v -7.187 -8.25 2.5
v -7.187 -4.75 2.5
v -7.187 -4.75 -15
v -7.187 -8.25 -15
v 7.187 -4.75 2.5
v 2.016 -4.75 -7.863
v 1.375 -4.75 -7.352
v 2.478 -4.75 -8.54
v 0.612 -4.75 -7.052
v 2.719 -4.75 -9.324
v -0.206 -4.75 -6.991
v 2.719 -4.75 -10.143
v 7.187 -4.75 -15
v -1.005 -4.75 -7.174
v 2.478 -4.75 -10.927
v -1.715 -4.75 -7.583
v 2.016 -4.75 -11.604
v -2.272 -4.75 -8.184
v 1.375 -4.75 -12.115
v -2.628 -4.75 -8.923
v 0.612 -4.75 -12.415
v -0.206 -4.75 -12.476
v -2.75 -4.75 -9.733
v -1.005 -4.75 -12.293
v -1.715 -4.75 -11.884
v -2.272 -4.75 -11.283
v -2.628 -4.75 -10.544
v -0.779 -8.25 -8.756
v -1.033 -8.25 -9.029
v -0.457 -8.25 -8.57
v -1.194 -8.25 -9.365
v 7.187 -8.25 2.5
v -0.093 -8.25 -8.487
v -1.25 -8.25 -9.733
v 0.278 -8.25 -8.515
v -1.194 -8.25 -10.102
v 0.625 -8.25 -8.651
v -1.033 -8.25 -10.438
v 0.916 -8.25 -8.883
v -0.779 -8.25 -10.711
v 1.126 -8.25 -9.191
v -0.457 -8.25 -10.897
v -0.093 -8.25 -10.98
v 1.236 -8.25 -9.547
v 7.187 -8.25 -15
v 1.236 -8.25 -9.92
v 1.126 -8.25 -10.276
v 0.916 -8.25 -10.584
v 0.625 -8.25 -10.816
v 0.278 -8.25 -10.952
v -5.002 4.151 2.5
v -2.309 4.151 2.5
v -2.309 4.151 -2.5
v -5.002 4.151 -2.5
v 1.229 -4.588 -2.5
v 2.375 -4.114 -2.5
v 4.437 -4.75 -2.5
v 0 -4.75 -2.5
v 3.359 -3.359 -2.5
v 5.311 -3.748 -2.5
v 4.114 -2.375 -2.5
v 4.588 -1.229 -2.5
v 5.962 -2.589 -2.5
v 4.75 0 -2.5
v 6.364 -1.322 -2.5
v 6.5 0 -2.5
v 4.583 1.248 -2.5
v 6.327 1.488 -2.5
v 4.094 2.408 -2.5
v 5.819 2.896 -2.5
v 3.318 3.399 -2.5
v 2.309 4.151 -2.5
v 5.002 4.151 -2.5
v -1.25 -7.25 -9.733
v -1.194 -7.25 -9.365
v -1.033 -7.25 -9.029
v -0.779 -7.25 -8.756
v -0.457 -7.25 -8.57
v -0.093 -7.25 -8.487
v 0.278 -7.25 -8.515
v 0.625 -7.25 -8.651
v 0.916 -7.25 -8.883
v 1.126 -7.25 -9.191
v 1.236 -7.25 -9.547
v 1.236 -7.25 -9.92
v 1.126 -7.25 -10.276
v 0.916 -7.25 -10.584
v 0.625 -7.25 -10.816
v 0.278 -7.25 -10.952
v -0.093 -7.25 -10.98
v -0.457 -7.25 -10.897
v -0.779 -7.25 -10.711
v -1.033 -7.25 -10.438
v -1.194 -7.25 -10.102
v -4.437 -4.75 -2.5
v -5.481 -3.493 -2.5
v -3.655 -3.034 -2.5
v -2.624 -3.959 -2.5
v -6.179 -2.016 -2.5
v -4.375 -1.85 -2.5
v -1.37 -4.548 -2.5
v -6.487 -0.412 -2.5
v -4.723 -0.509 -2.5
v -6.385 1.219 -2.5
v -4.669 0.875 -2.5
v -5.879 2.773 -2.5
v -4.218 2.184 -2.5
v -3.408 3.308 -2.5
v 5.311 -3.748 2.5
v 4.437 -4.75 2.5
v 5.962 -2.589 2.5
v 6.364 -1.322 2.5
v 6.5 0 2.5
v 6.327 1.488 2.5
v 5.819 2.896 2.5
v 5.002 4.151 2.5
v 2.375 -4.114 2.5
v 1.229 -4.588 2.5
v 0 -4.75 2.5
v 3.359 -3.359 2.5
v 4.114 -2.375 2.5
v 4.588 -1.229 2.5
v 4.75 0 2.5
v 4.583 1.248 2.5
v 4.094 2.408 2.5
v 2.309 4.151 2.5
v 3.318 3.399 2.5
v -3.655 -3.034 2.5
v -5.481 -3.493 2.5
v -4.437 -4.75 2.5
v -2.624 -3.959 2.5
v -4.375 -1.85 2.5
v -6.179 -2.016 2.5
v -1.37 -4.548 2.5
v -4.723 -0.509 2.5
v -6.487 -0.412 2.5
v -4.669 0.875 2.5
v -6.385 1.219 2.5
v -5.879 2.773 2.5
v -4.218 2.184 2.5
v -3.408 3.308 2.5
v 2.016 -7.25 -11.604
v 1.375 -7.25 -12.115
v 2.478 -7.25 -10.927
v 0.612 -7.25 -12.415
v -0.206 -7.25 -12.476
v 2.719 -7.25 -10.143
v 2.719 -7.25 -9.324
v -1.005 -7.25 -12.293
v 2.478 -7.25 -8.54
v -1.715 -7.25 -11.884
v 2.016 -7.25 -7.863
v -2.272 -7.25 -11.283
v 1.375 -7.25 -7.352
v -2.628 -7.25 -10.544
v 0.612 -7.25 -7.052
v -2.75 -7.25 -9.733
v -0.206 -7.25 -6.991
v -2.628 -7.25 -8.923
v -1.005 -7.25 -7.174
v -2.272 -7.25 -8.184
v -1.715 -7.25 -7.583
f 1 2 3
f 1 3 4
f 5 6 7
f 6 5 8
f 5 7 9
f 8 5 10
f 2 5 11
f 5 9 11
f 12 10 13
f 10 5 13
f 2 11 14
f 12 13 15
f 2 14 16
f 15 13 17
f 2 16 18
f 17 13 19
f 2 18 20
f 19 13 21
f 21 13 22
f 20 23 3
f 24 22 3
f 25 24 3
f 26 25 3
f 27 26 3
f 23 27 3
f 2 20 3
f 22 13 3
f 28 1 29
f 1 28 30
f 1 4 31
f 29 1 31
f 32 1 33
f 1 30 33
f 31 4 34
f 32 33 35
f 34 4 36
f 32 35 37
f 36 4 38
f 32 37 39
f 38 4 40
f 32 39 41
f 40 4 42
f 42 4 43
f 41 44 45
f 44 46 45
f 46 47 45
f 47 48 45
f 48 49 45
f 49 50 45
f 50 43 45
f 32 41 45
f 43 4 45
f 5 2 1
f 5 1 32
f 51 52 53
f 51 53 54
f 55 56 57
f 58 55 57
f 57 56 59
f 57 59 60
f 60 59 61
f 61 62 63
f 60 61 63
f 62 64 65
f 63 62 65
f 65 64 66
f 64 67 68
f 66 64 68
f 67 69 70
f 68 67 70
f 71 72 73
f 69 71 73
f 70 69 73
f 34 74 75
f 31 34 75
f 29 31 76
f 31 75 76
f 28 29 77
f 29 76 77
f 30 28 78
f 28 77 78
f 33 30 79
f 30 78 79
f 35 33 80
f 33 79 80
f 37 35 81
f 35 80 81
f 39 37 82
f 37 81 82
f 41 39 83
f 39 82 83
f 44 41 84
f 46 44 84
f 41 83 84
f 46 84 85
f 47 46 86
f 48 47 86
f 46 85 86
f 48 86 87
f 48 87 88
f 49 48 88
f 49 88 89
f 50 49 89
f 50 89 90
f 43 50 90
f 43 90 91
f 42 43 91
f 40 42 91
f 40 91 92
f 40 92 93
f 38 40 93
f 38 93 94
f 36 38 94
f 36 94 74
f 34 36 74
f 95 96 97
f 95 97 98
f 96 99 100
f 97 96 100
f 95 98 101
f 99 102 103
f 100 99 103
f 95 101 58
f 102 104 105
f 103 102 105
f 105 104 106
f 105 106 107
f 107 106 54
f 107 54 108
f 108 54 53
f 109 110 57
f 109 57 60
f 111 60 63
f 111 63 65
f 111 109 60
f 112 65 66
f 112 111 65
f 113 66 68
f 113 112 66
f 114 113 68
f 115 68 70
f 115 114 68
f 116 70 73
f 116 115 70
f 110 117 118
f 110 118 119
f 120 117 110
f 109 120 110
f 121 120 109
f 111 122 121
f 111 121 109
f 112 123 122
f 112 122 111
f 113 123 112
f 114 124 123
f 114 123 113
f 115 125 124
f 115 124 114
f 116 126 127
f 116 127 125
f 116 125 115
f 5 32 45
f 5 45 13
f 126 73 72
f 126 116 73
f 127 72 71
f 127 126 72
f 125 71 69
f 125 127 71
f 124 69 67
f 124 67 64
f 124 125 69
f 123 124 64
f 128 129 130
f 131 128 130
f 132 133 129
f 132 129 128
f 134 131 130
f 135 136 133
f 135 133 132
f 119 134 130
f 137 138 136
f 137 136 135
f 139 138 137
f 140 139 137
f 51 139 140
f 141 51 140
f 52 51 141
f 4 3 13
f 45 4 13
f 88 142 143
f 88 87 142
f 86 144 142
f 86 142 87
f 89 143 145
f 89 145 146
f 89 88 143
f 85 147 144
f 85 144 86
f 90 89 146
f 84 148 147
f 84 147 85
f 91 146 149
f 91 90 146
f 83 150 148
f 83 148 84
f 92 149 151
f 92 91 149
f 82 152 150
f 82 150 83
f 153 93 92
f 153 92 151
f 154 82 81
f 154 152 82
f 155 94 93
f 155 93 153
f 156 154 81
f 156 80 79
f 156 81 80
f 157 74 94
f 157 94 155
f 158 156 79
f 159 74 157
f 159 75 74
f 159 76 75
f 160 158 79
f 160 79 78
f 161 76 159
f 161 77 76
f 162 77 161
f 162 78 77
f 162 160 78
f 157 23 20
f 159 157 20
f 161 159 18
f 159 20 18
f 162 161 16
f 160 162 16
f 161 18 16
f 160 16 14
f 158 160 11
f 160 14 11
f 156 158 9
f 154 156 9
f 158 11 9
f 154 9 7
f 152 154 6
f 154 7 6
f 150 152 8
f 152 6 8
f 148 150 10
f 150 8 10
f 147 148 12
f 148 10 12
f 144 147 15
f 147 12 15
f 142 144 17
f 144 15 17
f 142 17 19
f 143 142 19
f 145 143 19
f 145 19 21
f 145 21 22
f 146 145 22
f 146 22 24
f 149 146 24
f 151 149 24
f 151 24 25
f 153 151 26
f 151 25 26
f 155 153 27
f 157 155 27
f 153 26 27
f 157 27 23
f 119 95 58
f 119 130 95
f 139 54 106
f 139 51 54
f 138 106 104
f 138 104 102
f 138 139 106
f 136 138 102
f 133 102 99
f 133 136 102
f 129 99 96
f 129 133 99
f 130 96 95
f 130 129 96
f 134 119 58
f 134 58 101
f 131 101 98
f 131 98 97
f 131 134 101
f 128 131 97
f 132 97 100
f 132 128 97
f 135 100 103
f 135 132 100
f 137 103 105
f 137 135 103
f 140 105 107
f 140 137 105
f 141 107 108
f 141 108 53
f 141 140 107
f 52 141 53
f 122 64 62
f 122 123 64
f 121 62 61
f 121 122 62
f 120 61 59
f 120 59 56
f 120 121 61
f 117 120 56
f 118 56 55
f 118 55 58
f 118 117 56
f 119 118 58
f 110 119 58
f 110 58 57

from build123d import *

# Parameters (mm, degrees)
F1_DEPTH      = 2.5
F2_DEPTH      = 15
F2_DEPTH_BACK = 2.5
F3_R          = 1.25
F4_DEPTH      = 25
F3_R_2        = 2.75
F5_DEPTH      = 2.5


with BuildPart() as f1:
    # F0 (on Top) → F1 (new body, symmetric)
    with BuildSketch(Plane.XY):
        with BuildLine():
            Line((-4.4370598373, -4.75), (0, -4.75))
            ThreePointArc((0, -4.75), (-4.5978347264, -1.1926507572), (-2.3088888707, 4.1510880721))
            Line((-2.3088888707, 4.1510880721), (-5.0018464408, 4.1510880721))
            ThreePointArc((-5.0018464408, 4.1510880721), (-6.4869546128, -0.4116064276), (-4.4370598373, -4.75))
        make_face()
    extrude(amount=F1_DEPTH, both=True)


with BuildPart() as f1b:
    # F0 (on Top) → F1, piece 2 (new body, symmetric)
    with BuildSketch(Plane.XY):
        with BuildLine():
            ThreePointArc((4.75, 0), (3.3587572106, -3.3587572106), (0, -4.75))
            Line((0, -4.75), (4.4370598373, -4.75))
            ThreePointArc((4.4370598373, -4.75), (5.9620000395, -2.5893156487), (6.5, 0))
            ThreePointArc((6.5, 0), (6.1140004034, 2.2065808545), (5.0018464408, 4.1510880721))
            Line((5.0018464408, 4.1510880721), (2.3088888707, 4.1510880721))
            ThreePointArc((2.3088888707, 4.1510880721), (4.0944915518, 2.4078286758), (4.75, 0))
        make_face()
    extrude(amount=F1_DEPTH, both=True)


with BuildPart() as f2:
    # F0 (on Top) → F2 (new body, two sides)
    with BuildSketch(Plane.XY) as f2_sk:
        with BuildLine():
            ThreePointArc((4.4370598373, -4.75), (0, -6.5), (-4.4370598373, -4.75))
            Line((-4.4370598373, -4.75), (-7.1870598373, -4.75))
            Line((-7.1870598373, -4.75), (-7.1870598373, -8.25))
            Line((-7.1870598373, -8.25), (7.1870598373, -8.25))
            Line((7.1870598373, -8.25), (7.1870598373, -4.75))
            Line((7.1870598373, -4.75), (4.4370598373, -4.75))
        make_face()
        with BuildLine():
            Line((4.4370598373, -4.75), (0, -4.75))
            Line((0, -4.75), (-4.4370598373, -4.75))
            ThreePointArc((-4.4370598373, -4.75), (0, -6.5), (4.4370598373, -4.75))
        make_face()
    extrude(amount=-F2_DEPTH)
    extrude(f2_sk.sketch, amount=F2_DEPTH_BACK)

    # F3 (on face) → F4 (cut)
    with BuildSketch(Plane(origin=(0, -4.75, 0), x_dir=(-1, 0, 0), z_dir=(0, 1, 0))):
        with Locations((0, -9.7334859893)):
            Circle(F3_R)
    extrude(amount=-F4_DEPTH, mode=Mode.SUBTRACT)

    # F3 (on face) → F5 (cut)
    with BuildSketch(Plane(origin=(0, -4.75, 0), x_dir=(-1, 0, 0), z_dir=(0, 1, 0))):
        with Locations((0, -9.7334859893)):
            Circle(F3_R_2)
        with Locations((0, -9.7334859893)):
            Circle(F3_R, mode=Mode.SUBTRACT)
    extrude(amount=-F5_DEPTH, mode=Mode.SUBTRACT)


solid = Compound([f1.part, f1b.part, f2.part])
